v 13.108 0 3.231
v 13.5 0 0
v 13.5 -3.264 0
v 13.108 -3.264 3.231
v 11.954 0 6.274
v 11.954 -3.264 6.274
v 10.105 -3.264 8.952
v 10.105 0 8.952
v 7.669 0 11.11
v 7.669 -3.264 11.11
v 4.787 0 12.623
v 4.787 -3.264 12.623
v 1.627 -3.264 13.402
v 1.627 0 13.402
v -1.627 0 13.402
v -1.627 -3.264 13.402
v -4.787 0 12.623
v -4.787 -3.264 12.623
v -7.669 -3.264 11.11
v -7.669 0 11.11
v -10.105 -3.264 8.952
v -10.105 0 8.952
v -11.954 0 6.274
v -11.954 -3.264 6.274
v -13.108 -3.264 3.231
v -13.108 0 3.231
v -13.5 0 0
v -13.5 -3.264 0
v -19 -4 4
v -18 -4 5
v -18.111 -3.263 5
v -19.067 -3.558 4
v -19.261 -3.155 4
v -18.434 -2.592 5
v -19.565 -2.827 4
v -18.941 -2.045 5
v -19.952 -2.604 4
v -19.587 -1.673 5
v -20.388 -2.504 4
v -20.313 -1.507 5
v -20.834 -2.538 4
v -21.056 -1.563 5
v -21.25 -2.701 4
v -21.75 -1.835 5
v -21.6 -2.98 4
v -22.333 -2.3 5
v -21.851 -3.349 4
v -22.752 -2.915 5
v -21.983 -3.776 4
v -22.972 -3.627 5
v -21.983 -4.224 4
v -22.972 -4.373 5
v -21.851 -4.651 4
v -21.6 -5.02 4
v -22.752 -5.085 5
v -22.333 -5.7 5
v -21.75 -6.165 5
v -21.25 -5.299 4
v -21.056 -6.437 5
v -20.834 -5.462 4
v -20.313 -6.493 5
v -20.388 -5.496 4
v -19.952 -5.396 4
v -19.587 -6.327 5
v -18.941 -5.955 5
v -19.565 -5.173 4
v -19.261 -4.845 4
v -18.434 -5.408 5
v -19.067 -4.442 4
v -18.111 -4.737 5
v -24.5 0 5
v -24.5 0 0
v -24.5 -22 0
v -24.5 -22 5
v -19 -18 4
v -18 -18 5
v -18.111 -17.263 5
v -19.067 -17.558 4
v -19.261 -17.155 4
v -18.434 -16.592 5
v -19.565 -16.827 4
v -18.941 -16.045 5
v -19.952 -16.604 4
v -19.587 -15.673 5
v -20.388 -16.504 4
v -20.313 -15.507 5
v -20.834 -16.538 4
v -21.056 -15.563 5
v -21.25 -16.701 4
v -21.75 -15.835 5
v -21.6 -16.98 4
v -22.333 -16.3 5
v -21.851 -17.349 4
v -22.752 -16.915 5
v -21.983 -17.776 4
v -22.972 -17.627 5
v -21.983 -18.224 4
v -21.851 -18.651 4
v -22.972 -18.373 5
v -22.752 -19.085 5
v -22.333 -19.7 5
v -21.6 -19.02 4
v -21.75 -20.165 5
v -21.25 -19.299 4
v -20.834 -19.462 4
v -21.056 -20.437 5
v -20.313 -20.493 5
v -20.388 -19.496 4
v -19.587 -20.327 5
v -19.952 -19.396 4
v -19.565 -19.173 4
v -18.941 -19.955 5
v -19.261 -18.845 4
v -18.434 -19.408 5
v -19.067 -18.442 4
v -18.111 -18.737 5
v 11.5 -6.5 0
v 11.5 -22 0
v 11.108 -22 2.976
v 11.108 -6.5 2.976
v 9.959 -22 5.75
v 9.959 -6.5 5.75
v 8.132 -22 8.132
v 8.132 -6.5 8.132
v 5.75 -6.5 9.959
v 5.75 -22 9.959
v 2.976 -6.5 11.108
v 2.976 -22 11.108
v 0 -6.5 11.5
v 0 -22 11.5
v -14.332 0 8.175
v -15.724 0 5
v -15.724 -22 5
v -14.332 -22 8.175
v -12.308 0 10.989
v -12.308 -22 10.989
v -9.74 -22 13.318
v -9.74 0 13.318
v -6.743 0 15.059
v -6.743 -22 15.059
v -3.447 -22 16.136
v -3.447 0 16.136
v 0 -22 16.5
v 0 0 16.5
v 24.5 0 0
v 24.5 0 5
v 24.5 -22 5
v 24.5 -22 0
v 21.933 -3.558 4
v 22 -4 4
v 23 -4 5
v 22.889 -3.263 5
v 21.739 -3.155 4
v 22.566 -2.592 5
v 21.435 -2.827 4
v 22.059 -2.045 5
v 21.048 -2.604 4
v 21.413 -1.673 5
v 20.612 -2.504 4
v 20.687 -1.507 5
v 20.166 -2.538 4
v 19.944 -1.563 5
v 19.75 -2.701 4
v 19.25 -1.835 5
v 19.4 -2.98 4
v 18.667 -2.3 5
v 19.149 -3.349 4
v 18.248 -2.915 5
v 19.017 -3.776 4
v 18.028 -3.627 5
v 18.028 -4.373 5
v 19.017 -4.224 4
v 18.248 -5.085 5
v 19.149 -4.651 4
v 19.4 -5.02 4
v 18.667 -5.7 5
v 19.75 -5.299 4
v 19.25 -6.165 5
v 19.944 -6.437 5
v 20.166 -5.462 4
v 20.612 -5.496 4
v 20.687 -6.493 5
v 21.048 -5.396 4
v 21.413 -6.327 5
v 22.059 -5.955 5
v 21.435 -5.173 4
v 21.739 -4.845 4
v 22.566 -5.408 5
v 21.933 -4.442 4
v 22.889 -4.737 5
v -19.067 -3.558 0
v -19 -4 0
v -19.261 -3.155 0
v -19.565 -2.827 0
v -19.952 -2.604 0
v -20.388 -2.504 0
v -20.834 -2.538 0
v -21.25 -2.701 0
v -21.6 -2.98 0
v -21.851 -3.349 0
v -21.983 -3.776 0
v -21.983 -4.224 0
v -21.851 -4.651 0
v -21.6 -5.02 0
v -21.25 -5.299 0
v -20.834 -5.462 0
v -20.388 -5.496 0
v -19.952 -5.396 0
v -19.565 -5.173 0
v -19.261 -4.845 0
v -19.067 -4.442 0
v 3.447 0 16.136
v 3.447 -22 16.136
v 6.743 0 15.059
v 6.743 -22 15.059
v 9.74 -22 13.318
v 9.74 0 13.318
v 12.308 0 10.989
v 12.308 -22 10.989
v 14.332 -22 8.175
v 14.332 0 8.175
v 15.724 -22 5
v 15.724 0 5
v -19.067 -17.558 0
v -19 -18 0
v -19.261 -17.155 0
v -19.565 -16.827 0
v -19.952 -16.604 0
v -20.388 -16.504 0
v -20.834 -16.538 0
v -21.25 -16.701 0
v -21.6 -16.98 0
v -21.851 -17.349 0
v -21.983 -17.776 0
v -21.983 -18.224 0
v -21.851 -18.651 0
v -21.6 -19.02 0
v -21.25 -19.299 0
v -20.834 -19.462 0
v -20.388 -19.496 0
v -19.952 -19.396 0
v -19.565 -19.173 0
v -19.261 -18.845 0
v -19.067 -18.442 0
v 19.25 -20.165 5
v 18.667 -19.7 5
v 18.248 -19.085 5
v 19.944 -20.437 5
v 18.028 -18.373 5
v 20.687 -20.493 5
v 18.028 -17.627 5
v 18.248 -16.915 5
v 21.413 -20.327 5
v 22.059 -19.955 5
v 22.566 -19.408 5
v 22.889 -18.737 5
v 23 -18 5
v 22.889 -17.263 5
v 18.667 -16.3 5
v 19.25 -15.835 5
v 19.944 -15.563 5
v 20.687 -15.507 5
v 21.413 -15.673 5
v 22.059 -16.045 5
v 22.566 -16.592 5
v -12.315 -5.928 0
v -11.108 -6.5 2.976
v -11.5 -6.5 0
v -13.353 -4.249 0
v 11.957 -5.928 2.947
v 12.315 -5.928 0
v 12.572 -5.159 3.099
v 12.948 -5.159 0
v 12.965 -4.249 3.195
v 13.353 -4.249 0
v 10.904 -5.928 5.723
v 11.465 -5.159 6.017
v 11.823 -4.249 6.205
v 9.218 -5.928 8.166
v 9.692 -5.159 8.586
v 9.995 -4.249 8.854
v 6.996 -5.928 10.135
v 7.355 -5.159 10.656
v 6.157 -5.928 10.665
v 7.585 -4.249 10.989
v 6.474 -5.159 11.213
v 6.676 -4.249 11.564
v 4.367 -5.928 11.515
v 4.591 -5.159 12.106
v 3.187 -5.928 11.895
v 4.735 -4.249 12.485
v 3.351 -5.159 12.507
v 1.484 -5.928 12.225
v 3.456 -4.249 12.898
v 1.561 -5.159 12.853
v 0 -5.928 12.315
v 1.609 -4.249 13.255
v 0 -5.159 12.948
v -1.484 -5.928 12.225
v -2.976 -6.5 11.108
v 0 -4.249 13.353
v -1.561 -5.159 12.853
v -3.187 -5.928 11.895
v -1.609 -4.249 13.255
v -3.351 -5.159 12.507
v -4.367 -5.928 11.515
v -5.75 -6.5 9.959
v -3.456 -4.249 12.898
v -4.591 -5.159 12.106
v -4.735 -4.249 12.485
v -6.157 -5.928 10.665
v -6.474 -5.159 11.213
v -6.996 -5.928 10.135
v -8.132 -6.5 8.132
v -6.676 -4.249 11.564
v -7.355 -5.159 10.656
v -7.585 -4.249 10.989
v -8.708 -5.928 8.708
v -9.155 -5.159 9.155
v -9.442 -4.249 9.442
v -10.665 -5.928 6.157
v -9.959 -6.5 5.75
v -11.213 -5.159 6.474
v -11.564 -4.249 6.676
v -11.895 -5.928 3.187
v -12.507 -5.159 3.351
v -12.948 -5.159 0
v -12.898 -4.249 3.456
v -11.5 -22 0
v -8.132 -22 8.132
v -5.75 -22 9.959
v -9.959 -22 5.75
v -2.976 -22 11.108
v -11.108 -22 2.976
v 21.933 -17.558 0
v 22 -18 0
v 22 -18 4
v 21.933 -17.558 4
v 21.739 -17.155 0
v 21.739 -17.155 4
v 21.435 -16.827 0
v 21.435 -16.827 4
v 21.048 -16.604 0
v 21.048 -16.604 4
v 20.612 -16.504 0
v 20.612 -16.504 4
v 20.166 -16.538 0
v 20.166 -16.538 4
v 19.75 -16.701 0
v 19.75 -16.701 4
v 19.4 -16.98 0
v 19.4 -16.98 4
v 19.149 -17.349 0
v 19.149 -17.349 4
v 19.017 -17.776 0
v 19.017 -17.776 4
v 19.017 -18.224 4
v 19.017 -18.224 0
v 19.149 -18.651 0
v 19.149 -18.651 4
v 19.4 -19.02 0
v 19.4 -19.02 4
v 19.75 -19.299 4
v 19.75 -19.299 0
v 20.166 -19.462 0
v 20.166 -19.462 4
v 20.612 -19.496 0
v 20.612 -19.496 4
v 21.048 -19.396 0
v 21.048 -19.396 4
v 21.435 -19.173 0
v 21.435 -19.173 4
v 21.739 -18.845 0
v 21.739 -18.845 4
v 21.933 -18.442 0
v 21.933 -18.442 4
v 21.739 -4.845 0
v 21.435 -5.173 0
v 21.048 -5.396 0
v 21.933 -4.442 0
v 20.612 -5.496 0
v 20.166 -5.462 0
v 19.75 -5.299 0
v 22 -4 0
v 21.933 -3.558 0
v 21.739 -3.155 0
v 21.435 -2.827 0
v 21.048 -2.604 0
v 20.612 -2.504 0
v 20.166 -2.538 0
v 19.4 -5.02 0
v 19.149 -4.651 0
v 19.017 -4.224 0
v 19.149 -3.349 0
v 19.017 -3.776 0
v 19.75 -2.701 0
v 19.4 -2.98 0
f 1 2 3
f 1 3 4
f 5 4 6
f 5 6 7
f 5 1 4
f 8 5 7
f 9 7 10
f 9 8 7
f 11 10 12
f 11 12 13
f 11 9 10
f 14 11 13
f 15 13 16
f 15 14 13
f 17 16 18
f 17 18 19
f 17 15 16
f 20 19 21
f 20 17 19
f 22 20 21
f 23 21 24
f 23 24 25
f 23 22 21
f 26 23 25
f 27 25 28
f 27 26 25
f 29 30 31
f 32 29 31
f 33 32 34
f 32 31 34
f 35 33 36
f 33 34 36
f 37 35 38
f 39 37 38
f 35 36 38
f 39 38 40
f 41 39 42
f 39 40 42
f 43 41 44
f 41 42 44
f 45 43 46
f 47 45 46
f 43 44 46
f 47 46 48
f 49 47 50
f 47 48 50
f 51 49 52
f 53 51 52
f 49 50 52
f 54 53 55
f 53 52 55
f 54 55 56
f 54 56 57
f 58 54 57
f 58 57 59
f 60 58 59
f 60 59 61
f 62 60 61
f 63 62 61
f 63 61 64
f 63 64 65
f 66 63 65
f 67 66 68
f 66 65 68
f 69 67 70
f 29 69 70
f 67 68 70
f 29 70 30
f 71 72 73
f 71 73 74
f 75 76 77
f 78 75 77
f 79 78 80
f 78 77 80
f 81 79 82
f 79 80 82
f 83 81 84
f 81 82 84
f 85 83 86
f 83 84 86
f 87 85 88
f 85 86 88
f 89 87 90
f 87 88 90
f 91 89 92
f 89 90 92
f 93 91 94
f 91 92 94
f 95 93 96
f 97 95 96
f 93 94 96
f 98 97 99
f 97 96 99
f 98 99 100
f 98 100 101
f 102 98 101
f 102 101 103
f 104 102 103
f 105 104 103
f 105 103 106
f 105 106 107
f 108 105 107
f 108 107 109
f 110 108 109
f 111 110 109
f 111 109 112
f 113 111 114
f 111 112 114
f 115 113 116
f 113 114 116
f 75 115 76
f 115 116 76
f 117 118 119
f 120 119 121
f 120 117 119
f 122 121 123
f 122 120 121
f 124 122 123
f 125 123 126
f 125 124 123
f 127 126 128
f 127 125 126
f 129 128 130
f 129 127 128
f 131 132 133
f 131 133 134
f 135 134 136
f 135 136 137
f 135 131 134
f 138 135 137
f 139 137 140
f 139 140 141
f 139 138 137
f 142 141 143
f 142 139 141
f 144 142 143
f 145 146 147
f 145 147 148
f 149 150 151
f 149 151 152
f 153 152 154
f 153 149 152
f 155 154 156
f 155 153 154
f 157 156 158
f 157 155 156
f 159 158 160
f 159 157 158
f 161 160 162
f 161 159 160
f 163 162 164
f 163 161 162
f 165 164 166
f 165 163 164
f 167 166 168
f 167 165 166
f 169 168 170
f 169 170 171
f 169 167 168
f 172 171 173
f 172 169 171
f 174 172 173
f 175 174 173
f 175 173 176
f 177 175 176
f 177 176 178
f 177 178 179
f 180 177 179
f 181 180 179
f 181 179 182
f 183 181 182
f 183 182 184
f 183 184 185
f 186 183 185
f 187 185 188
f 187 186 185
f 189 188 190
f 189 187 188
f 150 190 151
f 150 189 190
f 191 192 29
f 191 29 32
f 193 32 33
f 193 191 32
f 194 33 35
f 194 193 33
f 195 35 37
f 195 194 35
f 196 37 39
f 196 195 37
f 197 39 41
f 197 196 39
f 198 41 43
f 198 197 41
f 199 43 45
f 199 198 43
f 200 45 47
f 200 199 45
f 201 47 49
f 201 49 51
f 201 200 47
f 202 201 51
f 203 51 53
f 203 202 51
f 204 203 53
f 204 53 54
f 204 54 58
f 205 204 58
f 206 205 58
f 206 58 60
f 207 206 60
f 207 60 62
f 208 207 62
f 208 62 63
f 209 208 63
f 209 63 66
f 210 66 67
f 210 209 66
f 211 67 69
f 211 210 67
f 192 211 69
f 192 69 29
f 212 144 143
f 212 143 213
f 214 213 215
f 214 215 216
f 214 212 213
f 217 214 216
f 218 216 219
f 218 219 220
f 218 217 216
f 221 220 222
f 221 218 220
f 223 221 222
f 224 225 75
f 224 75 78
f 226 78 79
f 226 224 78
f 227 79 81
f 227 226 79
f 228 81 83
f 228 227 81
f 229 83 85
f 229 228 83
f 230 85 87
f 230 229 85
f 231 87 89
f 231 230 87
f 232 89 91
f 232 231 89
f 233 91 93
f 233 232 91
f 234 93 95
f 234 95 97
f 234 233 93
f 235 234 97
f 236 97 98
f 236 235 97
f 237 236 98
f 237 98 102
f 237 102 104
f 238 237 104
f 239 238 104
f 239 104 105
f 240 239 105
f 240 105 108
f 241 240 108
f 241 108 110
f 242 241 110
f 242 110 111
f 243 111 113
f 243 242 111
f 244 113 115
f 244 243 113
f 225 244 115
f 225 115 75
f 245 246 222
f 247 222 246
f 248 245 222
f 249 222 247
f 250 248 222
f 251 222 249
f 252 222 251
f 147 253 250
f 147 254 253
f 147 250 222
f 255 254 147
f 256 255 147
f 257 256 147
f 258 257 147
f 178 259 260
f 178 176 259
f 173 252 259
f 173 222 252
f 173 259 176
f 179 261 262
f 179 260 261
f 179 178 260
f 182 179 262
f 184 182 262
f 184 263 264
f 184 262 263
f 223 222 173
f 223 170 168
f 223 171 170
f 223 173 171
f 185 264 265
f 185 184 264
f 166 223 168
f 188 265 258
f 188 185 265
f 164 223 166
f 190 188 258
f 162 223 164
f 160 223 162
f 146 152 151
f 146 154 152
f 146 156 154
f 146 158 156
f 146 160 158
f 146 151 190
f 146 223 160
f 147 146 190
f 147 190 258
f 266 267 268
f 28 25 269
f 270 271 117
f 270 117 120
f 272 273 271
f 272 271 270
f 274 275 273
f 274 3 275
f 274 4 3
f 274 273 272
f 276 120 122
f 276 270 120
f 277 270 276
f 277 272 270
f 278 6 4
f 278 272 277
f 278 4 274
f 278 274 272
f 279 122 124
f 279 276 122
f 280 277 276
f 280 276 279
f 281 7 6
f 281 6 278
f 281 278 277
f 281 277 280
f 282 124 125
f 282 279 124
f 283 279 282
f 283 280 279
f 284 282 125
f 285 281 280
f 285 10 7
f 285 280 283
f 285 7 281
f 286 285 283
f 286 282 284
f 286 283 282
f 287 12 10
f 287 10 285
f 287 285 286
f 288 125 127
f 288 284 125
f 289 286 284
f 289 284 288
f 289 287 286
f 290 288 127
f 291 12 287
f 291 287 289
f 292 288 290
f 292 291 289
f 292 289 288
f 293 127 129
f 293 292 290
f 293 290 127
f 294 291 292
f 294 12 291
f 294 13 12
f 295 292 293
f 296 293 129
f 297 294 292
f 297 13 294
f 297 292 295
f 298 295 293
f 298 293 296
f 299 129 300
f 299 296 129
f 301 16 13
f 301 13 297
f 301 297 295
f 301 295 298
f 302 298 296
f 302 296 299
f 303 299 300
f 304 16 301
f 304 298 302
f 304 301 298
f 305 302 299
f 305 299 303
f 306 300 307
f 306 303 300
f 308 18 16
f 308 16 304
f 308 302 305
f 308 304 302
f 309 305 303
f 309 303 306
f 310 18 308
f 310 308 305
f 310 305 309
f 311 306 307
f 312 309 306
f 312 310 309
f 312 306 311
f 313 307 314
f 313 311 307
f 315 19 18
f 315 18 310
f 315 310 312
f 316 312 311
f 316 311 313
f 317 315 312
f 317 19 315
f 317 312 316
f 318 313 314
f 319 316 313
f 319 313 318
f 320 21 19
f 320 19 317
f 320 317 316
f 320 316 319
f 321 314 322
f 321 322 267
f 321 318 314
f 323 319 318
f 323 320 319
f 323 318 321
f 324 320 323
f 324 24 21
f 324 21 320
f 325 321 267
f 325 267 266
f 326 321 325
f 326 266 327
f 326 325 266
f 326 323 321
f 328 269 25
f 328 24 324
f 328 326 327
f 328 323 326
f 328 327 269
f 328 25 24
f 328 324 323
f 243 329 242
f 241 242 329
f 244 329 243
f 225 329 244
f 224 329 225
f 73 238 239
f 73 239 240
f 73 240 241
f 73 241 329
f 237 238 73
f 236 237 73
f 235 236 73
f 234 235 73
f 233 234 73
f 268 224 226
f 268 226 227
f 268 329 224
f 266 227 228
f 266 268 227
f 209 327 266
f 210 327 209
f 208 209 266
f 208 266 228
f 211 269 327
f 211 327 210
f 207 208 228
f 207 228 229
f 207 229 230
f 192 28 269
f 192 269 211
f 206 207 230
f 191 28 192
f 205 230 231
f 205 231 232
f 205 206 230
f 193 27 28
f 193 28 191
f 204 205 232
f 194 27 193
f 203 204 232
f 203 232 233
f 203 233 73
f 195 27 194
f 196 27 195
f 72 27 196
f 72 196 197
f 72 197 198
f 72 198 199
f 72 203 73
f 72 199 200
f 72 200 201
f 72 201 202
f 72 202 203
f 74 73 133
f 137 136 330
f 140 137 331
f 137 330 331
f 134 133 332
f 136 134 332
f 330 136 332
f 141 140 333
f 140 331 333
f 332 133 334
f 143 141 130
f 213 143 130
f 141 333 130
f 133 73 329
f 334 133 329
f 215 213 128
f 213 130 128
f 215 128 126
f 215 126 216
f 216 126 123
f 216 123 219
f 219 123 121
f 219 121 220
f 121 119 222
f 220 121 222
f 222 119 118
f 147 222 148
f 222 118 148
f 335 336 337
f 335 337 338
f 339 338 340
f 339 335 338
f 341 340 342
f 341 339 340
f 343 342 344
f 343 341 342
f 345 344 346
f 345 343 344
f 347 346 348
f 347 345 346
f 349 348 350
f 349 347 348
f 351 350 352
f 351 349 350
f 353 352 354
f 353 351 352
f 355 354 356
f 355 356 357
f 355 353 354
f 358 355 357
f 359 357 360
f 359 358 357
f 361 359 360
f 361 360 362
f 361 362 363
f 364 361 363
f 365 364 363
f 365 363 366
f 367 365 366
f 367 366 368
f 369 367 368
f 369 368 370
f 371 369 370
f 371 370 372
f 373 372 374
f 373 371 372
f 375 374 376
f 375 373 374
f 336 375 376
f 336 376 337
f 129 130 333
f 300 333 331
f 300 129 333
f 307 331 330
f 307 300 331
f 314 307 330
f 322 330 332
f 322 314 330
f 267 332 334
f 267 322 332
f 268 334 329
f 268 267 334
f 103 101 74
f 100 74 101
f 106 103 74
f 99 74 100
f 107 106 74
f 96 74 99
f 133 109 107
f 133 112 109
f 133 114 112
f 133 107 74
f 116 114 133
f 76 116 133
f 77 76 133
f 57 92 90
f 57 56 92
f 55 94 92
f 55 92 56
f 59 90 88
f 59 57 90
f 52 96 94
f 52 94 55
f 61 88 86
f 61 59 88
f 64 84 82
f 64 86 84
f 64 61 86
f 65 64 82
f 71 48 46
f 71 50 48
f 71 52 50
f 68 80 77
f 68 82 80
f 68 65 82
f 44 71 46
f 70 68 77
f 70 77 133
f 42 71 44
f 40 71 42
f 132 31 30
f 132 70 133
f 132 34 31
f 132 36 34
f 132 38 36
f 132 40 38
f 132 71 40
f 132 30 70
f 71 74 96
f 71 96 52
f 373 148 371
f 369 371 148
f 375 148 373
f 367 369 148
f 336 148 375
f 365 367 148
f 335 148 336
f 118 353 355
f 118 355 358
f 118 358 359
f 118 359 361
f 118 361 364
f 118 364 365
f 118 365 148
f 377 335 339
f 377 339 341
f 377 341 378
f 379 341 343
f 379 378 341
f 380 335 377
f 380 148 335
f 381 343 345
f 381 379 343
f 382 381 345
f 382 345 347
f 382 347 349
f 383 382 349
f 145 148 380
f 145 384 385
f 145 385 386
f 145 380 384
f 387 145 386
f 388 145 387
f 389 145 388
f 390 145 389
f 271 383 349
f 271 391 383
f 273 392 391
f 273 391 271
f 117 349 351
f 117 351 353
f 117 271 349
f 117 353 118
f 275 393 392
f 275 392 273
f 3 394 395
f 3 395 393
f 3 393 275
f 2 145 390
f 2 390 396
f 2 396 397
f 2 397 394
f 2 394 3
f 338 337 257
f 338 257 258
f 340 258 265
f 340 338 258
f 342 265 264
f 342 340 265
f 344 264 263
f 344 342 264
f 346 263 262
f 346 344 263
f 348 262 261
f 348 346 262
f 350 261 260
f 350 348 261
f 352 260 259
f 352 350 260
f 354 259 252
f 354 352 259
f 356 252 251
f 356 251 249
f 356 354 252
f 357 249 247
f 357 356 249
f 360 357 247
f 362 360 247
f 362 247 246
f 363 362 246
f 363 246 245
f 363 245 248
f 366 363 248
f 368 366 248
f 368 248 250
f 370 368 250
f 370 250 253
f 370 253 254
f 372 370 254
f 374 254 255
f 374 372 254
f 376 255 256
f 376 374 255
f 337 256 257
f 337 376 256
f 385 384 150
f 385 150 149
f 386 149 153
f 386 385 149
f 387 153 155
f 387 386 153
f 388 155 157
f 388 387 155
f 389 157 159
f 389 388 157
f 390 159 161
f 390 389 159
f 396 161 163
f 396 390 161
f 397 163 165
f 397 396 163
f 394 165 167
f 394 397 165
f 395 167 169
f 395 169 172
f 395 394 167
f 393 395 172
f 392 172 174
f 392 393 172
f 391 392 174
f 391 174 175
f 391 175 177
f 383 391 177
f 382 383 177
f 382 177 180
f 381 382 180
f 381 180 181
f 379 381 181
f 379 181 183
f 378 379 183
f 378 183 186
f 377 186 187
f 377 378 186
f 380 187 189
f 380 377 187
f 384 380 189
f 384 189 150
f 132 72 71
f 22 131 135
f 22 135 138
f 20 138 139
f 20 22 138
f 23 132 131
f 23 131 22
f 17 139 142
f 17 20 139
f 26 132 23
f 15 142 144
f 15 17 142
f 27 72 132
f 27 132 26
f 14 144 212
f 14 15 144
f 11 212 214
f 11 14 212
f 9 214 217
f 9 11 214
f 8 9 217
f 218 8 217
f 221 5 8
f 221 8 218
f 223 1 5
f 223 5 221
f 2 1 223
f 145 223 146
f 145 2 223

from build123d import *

# Parameters (mm, degrees)
BOSS_EXTRUDE1_DEPTH     = 22
BOSS_EXTRUDE3_START     = -5
BOSS_EXTRUDE3_OUTLINE_R = 1.5
BOSS_EXTRUDE3_DEPTH     = 5
CHAMFER2_SIZE           = 1


# Read off the part's stored shape, not the designer's step: Boss-Extrude3
with BuildPart() as part:
    # Sketch1 → Boss-Extrude1 (new body)
    with BuildSketch(Plane(origin=(0, 0, 0), x_dir=(1, 0, 0), z_dir=(0, 1, 0))):
        with BuildLine():
            Line((0, -16.5), (0, -11.5))
            ThreePointArc((0, -11.5), (-8.131727984, -8.131727984), (-11.5, 0))
            Line((-11.5, 0), (-16.5, 0))
            Line((-16.5, 0), (-24.5, 0))
            Line((-24.5, 0), (-24.5, -5))
            Line((-24.5, -5), (-15.724185194, -5))
            ThreePointArc((-15.724185194, -5), (-9.740379869, -13.318220602), (0, -16.5))
        make_face()
        with BuildLine():
            Line((24.5, 0), (16.5, 0))
            Line((16.5, 0), (11.5, 0))
            ThreePointArc((11.5, 0), (8.131727984, -8.131727984), (0, -11.5))
            Line((0, -11.5), (0, -16.5))
            ThreePointArc((0, -16.5), (9.740379869, -13.318220602), (15.724185194, -5))
            Line((15.724185194, -5), (24.5, -5))
            Line((24.5, -5), (24.5, 0))
        make_face()
    extrude(amount=-BOSS_EXTRUDE1_DEPTH)

    # Boss-Extrude3 outline → Boss-Extrude3 (cut)
    with BuildSketch(Plane.XY.offset(5).offset(BOSS_EXTRUDE3_START)):
        with Locations((20.5, -18)):
            Circle(BOSS_EXTRUDE3_OUTLINE_R)
        with Locations((20.5, -4)):
            Circle(BOSS_EXTRUDE3_OUTLINE_R)
        with Locations((-20.5, -4)):
            Circle(BOSS_EXTRUDE3_OUTLINE_R)
        with Locations((-20.5, -18)):
            Circle(BOSS_EXTRUDE3_OUTLINE_R)
    extrude(amount=BOSS_EXTRUDE3_DEPTH, mode=Mode.SUBTRACT)

    # Chamfer2
    chamfer2_edges = [part.edges().sort_by_distance(p)[0] for p in [
        (-22, -18, 5),
        (19, -4, 5),
        (19, -18, 5),
        (-22, -4, 5),
    ]]
    chamfer(chamfer2_edges, length=CHAMFER2_SIZE)

    # Sketch4 → Cut-Revolve2 (revolve, cut)
    with BuildSketch(Plane(origin=(0, 0, 0), x_dir=(-1, 0, 0), z_dir=(0, 0, -1))):
        with BuildLine():
            Line((-11.5, 0), (-11.5, -6.5))
            ThreePointArc((-11.5, -6.5), (-12.947807153, -5.158599205), (-13.5, -3.263715381))
            Line((-13.5, -3.263715381), (-13.5, 0))
            Line((-13.5, 0), (-11.5, 0))
        make_face()
    revolve(axis=Axis((0, 2.834255205, 0), (0, -1, 0)), mode=Mode.SUBTRACT)


solid = part.part
